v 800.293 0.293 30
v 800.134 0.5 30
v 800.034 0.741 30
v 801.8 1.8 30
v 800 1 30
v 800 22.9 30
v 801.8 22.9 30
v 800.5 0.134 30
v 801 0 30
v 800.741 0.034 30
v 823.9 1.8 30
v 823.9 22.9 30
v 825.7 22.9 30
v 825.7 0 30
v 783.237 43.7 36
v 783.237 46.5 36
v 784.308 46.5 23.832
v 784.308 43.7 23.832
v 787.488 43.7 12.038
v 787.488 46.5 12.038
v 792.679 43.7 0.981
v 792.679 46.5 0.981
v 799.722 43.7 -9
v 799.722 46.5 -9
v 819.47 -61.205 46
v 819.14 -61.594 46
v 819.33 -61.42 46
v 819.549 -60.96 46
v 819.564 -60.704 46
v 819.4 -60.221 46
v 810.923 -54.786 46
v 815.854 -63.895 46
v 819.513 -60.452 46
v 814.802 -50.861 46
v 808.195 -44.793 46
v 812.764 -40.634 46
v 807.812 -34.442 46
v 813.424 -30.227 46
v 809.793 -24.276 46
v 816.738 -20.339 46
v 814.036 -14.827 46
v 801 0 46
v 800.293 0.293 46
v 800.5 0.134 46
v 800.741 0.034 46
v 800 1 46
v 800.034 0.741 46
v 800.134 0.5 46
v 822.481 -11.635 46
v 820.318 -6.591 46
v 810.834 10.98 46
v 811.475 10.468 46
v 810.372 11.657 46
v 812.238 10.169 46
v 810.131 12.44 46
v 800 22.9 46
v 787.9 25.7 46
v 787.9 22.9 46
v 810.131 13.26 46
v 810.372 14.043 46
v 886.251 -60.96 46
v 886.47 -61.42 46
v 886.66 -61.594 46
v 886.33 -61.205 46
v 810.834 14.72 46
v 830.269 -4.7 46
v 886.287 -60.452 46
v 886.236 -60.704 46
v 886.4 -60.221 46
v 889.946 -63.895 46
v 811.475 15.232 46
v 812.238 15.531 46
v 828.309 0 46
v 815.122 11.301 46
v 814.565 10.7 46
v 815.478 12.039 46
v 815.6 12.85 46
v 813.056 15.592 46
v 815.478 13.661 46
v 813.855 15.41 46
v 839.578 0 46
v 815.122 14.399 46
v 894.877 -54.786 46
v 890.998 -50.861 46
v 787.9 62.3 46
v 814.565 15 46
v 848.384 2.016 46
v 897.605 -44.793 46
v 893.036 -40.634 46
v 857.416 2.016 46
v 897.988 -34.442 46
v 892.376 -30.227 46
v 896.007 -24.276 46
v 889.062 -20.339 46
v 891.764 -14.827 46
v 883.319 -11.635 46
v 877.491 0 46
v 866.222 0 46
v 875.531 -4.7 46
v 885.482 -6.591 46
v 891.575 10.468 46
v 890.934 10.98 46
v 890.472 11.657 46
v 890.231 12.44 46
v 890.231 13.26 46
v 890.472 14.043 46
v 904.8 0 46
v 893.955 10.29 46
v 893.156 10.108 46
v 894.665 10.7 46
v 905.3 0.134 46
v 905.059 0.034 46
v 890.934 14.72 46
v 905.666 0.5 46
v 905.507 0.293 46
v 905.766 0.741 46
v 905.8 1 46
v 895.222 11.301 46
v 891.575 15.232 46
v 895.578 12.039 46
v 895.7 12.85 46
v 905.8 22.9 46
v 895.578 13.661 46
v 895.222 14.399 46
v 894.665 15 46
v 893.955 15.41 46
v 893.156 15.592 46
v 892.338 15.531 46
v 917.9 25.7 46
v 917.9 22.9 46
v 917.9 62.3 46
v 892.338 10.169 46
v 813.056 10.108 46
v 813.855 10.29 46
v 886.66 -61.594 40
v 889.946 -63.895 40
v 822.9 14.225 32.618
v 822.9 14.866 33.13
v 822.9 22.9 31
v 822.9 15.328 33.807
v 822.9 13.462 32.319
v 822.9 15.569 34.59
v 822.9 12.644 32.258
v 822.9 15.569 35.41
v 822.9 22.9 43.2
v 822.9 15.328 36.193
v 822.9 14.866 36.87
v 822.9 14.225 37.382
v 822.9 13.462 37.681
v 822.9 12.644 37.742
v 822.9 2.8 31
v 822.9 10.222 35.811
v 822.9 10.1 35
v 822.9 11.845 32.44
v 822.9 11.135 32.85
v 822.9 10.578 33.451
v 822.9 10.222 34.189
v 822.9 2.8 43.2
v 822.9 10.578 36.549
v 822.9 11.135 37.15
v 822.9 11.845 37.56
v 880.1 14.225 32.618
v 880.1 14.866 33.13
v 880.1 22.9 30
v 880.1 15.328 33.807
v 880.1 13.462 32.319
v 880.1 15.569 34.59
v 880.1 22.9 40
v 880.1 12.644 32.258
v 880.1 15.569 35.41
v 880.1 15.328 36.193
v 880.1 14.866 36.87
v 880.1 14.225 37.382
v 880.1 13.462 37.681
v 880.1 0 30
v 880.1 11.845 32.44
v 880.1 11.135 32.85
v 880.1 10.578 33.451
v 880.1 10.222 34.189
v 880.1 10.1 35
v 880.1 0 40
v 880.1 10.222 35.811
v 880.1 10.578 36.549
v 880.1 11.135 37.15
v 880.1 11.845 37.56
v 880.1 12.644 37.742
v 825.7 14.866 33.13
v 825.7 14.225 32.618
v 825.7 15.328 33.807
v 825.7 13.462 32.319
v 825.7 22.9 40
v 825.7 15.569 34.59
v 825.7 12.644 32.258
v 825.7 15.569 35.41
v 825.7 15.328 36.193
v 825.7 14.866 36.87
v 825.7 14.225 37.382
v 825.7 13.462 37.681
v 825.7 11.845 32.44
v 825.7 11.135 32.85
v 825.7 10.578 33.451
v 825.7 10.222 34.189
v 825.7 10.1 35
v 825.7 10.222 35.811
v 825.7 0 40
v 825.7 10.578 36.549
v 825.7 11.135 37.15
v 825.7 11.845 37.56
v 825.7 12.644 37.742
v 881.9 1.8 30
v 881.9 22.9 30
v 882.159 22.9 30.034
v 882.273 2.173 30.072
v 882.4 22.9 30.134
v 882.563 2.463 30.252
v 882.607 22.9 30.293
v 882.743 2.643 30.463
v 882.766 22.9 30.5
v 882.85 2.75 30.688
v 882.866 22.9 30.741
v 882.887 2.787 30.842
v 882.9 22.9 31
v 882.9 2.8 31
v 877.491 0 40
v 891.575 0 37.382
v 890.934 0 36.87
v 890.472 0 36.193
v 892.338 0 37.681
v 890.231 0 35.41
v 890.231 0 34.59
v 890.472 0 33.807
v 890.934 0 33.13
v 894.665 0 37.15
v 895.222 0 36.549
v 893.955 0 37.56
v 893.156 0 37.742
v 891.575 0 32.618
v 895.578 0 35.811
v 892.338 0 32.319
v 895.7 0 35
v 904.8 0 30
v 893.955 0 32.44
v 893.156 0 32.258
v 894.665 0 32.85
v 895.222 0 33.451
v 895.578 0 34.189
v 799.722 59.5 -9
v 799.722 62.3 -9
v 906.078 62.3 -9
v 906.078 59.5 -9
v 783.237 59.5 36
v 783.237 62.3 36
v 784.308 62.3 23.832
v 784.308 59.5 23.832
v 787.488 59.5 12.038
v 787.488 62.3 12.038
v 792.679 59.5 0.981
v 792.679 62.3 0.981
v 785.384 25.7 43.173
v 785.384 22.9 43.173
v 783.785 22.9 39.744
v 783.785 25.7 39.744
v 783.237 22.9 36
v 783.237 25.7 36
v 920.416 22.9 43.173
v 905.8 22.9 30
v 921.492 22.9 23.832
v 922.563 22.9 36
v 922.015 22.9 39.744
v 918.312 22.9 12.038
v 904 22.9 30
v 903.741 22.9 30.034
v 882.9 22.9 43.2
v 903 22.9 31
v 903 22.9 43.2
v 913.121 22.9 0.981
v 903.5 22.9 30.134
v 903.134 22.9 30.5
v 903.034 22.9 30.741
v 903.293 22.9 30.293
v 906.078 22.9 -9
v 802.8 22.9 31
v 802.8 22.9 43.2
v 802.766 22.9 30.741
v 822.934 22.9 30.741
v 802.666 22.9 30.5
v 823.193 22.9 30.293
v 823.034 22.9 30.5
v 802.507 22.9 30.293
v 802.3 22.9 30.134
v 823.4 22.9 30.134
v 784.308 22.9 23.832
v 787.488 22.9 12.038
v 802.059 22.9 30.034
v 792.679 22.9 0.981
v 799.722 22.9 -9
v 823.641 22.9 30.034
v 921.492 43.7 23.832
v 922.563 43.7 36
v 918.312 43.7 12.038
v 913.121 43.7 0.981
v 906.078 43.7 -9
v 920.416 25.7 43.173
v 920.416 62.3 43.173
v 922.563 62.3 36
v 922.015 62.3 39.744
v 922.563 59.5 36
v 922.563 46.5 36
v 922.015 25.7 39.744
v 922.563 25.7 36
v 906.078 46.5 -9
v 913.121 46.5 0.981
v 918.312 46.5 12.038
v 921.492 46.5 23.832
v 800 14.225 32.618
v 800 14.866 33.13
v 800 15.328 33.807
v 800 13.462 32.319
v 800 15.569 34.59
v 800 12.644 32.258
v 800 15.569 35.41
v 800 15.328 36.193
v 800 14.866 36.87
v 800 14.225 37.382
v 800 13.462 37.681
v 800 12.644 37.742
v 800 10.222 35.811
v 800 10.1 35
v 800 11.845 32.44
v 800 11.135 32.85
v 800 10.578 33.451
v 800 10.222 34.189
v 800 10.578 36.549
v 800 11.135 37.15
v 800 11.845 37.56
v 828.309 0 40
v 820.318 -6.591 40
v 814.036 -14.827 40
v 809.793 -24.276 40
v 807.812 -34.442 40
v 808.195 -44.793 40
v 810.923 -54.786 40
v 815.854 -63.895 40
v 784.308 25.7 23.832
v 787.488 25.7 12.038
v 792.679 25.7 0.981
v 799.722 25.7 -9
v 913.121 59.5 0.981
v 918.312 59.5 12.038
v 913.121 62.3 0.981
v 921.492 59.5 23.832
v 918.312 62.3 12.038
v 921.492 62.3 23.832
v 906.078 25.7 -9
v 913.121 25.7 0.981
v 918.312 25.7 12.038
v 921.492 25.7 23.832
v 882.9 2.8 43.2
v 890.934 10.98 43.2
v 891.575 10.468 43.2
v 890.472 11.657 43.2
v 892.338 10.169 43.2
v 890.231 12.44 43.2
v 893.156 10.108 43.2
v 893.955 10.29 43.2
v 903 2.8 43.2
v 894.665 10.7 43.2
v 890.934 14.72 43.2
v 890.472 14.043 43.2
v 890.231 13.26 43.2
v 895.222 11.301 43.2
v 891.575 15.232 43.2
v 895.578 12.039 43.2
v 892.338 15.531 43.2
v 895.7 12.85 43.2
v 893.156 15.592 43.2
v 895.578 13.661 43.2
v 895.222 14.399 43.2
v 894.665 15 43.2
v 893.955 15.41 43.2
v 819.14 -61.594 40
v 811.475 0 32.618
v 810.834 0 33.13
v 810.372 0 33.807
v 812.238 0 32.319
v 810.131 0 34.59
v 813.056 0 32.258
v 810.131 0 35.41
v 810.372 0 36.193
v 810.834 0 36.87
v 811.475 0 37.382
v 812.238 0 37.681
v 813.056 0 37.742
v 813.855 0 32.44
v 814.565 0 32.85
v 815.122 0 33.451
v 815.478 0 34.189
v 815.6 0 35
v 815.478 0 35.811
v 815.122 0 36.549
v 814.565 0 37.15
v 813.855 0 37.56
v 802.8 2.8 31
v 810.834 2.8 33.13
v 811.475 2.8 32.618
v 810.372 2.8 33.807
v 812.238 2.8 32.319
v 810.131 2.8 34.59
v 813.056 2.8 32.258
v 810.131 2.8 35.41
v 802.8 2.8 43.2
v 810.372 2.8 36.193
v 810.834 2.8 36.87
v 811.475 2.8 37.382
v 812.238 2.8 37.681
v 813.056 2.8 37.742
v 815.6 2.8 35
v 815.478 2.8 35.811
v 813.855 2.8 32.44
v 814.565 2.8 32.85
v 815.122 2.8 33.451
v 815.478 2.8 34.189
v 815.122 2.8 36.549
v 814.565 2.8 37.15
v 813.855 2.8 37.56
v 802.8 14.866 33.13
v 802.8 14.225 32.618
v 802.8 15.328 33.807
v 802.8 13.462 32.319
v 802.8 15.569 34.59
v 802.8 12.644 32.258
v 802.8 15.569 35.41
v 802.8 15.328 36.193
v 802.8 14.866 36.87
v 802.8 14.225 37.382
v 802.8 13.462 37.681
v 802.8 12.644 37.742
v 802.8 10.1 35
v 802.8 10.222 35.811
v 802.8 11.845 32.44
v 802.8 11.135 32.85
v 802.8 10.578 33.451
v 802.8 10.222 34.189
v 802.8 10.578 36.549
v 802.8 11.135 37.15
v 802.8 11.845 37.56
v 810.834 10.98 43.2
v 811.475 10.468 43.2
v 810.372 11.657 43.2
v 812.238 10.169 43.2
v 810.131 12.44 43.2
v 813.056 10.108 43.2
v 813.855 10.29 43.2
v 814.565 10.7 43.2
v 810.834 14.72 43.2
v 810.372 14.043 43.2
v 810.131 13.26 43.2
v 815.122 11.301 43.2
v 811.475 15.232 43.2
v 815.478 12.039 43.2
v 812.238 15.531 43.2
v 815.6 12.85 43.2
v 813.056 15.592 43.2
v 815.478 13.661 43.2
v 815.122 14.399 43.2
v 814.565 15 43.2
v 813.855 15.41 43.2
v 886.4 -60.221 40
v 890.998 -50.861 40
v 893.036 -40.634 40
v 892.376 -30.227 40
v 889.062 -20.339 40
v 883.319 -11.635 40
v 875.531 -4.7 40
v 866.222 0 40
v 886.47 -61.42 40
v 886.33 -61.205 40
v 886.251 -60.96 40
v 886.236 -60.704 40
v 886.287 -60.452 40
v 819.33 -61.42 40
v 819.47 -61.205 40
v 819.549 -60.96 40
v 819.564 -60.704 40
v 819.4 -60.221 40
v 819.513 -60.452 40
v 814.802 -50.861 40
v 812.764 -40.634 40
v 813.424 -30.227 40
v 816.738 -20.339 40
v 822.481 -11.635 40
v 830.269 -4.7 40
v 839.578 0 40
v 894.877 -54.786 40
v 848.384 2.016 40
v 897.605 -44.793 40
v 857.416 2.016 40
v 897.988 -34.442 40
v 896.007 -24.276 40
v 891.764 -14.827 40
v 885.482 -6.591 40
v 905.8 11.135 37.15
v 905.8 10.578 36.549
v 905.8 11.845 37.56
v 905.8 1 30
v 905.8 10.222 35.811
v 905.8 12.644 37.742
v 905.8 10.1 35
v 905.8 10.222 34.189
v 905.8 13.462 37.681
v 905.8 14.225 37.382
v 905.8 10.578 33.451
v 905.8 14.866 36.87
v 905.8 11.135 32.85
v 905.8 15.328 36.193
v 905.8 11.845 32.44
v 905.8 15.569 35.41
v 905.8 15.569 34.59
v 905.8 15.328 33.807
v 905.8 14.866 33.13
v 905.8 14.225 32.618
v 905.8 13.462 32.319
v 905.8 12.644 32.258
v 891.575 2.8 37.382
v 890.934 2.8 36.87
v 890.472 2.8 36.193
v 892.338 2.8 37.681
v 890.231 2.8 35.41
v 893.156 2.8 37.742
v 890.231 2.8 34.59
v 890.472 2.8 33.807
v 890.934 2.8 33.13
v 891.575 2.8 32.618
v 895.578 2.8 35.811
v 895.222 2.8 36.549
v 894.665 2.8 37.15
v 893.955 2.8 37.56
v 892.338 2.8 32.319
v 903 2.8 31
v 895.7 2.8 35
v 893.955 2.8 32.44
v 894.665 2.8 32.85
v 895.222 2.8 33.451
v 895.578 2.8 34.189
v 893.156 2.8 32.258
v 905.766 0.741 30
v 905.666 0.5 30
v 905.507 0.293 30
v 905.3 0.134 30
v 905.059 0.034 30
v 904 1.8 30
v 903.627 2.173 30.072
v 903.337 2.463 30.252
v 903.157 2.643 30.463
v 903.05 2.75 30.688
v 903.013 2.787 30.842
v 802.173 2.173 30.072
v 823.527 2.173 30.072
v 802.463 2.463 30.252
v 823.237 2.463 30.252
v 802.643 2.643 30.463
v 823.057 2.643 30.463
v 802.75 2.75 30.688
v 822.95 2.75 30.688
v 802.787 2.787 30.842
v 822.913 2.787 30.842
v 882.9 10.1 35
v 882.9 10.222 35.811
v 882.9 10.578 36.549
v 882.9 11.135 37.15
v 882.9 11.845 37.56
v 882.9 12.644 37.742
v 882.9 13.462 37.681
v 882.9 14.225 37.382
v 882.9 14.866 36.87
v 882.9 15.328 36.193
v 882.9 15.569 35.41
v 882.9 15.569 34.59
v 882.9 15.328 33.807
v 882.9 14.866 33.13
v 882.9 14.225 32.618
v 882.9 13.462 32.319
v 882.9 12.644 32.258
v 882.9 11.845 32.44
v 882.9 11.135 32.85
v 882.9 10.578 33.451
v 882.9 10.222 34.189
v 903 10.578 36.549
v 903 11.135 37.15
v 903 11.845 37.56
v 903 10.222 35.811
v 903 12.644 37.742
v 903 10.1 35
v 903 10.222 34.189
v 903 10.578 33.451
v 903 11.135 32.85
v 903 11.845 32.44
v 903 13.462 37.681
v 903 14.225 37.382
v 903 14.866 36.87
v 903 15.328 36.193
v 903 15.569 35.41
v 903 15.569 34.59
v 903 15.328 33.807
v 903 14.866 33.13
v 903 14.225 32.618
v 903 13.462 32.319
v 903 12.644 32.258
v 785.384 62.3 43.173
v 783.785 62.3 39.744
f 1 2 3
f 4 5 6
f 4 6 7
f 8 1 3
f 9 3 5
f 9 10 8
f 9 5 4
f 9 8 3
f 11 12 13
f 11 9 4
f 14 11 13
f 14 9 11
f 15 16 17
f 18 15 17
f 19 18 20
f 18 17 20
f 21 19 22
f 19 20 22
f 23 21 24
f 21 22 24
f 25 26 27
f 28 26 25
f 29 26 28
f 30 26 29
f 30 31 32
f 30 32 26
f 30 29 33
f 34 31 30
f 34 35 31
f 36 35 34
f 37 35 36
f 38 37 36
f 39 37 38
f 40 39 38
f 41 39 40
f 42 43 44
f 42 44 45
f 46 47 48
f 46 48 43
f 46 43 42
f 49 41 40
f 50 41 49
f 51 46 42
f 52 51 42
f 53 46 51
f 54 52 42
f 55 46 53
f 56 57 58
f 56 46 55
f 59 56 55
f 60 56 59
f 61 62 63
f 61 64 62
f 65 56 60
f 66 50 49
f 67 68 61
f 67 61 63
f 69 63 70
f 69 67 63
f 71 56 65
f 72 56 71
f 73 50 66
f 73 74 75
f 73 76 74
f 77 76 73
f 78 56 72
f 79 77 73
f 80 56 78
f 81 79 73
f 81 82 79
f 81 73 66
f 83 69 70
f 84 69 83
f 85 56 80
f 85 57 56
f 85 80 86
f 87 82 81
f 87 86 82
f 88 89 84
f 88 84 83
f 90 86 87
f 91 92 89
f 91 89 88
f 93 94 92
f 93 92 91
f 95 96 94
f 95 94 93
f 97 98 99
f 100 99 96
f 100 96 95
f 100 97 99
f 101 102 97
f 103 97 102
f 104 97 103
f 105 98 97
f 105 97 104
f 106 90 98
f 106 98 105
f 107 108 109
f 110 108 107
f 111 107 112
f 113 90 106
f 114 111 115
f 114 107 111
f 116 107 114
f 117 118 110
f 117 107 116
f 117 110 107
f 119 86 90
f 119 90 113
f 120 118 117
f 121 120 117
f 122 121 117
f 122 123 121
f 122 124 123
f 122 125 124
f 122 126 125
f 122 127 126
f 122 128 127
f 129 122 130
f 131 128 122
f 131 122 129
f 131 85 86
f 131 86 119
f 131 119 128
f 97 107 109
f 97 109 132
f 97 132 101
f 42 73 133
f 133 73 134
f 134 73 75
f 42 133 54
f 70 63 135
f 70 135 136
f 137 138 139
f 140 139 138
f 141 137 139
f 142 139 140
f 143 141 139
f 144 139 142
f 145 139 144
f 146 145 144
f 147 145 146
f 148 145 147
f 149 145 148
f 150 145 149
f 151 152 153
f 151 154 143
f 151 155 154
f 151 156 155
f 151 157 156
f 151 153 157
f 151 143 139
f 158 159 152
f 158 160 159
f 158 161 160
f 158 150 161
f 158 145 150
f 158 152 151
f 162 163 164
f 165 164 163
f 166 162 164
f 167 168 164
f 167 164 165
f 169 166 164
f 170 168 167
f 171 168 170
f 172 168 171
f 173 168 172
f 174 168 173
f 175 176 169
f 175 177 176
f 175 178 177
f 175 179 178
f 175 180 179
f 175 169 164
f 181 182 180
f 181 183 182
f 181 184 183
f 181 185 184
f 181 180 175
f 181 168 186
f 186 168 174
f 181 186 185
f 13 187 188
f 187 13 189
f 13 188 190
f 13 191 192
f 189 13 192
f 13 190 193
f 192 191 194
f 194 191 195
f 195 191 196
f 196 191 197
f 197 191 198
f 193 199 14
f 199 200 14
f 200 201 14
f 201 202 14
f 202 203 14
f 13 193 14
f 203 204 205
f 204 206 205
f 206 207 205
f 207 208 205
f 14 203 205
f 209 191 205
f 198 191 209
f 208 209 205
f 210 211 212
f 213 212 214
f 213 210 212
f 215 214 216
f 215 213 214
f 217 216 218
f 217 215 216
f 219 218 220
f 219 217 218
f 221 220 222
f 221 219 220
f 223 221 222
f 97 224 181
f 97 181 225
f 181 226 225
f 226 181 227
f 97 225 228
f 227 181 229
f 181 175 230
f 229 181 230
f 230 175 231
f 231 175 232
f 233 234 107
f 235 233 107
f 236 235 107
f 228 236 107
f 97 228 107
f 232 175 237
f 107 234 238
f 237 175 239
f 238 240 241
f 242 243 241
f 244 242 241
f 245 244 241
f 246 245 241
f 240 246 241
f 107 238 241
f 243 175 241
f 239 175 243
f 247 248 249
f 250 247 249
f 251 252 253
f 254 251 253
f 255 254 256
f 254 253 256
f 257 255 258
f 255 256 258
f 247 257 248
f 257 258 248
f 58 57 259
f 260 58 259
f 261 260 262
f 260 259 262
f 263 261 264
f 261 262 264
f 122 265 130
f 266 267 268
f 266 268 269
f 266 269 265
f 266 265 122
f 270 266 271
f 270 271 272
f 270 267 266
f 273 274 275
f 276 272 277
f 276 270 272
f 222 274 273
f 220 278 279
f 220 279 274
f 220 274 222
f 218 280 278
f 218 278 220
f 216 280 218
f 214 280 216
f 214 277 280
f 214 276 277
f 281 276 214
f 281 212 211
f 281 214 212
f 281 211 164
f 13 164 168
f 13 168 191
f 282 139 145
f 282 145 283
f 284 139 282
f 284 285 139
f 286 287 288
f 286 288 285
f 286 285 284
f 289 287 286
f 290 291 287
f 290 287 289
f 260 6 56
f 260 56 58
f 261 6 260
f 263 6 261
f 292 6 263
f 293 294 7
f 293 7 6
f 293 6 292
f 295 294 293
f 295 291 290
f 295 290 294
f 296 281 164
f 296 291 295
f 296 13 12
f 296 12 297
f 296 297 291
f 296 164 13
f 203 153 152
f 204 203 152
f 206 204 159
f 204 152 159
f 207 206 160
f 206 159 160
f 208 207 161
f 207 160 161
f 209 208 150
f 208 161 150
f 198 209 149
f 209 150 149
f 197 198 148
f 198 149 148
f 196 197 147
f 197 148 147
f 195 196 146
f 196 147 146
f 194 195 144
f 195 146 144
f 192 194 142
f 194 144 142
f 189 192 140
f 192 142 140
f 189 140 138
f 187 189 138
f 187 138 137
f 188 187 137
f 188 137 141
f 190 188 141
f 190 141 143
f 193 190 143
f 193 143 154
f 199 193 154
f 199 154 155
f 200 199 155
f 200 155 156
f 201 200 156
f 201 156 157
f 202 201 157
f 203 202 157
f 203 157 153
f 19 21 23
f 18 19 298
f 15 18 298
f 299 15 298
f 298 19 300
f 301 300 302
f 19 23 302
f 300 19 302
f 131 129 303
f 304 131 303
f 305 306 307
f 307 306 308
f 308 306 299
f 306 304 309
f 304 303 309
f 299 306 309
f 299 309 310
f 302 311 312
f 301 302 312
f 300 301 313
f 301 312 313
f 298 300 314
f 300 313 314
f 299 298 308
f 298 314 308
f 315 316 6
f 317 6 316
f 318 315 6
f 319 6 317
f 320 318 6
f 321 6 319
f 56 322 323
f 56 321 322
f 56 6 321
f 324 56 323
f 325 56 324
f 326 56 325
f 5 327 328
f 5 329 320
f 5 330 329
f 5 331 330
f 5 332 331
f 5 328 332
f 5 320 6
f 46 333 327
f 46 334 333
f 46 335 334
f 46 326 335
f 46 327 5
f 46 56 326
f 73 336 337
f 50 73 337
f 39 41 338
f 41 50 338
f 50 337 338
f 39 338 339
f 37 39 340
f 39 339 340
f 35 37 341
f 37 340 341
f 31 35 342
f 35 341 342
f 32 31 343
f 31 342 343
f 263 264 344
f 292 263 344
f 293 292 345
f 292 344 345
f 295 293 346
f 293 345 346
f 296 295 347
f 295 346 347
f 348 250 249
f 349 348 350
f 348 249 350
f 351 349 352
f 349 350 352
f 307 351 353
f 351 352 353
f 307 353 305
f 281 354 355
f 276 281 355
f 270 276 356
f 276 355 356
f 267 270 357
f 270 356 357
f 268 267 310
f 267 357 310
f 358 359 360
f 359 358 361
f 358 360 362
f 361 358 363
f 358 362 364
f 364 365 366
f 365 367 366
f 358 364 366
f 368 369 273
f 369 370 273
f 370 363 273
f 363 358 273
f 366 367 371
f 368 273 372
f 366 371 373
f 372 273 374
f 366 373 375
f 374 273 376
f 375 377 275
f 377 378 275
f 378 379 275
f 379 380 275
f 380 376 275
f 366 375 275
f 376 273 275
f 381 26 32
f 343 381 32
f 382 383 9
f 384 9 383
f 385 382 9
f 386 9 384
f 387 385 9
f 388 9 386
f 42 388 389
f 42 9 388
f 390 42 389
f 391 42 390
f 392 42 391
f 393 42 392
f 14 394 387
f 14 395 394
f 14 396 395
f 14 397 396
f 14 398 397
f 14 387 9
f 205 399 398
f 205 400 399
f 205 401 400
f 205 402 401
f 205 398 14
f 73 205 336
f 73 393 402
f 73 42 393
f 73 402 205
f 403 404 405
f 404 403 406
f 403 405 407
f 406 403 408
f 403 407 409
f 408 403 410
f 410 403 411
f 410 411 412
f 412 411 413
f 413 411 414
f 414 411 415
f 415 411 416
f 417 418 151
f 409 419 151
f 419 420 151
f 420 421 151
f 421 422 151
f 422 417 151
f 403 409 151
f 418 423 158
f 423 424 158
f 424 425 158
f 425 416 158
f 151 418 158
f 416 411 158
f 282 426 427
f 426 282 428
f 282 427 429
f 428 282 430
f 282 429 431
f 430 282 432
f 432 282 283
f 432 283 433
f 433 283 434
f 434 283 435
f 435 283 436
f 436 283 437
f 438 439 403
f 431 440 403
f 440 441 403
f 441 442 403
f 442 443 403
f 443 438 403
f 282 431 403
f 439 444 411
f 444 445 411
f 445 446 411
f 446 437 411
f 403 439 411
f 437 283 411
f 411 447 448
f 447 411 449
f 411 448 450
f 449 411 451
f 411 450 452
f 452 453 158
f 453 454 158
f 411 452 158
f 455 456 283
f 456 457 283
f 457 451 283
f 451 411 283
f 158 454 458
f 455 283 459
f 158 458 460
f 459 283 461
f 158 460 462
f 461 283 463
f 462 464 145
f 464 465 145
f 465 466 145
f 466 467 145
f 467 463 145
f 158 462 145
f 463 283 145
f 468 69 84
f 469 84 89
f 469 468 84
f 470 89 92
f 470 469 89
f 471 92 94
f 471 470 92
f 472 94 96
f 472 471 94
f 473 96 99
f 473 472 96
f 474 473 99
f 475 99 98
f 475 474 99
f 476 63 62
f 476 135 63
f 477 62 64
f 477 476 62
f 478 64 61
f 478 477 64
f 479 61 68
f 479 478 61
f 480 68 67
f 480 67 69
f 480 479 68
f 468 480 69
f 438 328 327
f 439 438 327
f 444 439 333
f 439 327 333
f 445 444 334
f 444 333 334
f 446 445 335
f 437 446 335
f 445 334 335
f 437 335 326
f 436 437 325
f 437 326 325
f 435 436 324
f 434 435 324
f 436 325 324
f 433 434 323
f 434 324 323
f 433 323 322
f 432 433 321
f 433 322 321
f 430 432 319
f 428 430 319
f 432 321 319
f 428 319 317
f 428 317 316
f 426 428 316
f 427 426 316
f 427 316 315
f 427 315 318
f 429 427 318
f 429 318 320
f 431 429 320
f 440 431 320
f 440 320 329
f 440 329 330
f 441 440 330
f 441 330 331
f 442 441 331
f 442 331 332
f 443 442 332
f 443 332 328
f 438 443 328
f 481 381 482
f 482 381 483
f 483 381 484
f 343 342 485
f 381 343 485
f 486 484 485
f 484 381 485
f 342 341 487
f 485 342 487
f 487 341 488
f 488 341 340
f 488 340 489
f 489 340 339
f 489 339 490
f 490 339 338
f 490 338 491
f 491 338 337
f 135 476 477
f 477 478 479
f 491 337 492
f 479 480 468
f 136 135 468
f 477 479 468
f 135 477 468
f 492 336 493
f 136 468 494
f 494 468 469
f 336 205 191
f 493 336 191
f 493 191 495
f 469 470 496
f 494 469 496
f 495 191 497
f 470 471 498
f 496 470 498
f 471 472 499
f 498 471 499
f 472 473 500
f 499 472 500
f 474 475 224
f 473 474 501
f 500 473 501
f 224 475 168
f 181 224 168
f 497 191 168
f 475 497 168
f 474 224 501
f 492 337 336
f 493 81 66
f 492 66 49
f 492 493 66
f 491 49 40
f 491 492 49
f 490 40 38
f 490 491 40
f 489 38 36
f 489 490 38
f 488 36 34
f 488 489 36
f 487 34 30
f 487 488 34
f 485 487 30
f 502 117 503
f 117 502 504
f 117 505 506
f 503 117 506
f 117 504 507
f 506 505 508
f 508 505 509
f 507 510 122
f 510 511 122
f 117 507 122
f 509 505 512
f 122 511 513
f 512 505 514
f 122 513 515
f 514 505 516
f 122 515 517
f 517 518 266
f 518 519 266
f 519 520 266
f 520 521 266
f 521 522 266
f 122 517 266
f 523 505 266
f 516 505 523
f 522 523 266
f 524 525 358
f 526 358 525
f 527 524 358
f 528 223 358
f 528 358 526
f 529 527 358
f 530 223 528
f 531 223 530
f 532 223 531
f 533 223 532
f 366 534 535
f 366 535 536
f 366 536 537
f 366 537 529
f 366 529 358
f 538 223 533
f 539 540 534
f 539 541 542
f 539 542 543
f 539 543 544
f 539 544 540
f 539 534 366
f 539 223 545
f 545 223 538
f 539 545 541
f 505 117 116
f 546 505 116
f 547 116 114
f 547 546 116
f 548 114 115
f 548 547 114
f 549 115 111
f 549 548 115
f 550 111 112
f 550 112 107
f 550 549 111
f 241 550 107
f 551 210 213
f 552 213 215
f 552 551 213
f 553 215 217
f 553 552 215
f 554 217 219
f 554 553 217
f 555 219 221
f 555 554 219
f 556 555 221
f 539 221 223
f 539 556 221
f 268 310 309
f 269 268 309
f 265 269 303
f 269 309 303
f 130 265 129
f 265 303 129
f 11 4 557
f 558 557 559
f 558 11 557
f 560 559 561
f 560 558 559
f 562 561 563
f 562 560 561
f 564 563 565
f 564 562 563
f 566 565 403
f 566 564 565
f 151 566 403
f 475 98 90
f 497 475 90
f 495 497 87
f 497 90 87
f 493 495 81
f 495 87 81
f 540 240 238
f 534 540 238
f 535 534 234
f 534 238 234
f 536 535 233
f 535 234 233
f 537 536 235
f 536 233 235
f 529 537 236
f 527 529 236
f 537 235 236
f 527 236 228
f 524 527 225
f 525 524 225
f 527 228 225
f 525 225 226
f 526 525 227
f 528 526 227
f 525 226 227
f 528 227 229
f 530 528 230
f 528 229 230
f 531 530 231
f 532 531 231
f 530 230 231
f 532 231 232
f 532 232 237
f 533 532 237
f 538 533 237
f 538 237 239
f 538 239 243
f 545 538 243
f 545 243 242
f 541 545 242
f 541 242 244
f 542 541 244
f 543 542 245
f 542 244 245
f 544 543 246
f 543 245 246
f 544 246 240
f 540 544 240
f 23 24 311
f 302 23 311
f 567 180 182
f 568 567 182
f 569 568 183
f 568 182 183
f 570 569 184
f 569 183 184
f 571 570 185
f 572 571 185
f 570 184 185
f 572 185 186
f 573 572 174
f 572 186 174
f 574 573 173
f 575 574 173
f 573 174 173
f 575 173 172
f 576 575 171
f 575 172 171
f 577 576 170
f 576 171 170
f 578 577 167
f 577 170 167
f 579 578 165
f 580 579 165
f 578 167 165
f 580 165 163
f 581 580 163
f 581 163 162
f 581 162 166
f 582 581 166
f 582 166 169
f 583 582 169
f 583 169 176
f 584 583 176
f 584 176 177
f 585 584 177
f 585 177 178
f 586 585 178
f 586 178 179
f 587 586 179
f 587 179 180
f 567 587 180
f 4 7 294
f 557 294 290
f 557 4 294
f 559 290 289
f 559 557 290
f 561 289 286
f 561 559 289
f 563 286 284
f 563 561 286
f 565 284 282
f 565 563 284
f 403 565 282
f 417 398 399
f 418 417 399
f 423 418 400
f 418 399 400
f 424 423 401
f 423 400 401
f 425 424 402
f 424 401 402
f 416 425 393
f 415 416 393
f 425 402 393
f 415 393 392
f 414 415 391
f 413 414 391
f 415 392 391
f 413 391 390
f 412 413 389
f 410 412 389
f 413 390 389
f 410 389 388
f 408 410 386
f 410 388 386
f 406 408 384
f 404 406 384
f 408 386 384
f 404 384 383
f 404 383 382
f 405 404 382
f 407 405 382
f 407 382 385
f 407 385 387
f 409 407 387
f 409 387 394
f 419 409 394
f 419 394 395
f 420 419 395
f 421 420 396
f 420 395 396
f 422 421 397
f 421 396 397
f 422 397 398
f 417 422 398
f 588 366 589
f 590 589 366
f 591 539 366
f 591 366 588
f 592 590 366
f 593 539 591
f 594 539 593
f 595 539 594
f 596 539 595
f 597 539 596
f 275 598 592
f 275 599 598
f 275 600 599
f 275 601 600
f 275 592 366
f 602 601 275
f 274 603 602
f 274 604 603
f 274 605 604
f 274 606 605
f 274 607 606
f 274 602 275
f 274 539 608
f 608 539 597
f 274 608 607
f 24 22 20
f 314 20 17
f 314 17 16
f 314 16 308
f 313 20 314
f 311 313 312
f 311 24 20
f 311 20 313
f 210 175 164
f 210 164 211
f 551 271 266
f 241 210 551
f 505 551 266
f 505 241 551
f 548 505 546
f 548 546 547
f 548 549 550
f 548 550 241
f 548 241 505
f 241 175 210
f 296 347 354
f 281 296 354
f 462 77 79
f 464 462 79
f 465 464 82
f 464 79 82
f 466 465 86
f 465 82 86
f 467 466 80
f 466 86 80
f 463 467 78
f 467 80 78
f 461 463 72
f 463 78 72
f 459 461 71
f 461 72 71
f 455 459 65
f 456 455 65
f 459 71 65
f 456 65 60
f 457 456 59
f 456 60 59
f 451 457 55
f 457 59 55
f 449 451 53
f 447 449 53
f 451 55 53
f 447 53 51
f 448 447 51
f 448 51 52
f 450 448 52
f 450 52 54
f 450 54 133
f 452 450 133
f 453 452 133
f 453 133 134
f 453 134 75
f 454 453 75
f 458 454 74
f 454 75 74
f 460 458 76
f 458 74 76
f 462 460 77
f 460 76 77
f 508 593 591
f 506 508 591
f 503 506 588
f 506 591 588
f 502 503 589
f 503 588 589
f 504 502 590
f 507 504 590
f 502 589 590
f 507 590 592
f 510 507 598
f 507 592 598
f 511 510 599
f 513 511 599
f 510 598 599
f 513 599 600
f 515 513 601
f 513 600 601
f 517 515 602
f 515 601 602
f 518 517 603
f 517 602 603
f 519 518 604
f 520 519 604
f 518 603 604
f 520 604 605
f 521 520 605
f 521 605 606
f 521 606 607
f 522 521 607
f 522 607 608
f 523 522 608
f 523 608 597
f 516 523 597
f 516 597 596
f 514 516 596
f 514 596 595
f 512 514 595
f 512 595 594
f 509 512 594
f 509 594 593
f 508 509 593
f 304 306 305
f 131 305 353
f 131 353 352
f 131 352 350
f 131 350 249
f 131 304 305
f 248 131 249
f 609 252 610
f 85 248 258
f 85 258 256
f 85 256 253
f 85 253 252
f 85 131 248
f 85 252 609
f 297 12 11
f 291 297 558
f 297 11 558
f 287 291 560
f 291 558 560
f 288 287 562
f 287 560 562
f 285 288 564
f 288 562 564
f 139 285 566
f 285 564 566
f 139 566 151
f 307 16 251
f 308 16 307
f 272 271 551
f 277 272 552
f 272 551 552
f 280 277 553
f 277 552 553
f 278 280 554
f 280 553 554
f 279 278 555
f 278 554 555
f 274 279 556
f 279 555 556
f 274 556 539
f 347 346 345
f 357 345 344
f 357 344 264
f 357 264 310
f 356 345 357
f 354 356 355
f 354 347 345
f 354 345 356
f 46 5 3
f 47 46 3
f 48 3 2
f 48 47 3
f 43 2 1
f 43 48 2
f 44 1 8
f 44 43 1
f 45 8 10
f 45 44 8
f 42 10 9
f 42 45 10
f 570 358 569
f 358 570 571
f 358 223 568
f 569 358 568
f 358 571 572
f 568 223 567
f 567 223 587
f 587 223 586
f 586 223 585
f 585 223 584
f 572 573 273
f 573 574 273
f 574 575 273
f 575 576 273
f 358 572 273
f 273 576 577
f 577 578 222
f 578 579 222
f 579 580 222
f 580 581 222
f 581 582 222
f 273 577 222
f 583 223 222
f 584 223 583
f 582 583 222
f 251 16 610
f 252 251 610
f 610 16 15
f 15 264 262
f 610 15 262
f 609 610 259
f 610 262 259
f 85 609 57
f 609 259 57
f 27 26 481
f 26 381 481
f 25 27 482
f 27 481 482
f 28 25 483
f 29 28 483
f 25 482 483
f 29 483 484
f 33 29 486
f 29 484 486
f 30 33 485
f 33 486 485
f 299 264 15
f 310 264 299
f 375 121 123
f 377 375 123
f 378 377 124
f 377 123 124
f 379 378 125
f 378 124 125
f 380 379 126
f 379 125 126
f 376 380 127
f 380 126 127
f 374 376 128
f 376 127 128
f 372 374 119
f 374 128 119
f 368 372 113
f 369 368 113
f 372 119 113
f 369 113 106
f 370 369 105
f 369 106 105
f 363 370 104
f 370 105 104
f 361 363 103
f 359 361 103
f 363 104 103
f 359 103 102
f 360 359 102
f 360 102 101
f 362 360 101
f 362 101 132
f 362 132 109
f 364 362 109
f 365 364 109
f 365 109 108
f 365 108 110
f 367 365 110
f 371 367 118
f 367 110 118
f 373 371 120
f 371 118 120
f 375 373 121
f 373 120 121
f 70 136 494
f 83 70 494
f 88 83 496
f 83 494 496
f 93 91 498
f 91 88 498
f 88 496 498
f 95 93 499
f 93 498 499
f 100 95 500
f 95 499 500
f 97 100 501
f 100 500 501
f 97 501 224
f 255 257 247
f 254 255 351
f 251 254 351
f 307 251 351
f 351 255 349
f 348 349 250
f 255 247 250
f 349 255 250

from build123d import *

# Parameters (mm, degrees)
SKETCH047_W     = 105.8
SKETCH047_H     = 25.7
SKETCH047_W_2   = 20.1
SKETCH047_H_2   = 20.1
PAD026_DEPTH    = 6
SKETCH043_R     = 45.225
SKETCH043_R_2   = 40.225
PAD027_DEPTH    = 6
POCKET028_DEPTH = 6
POCKET026_DEPTH = 6
FILLET011_R     = 1
SKETCH049_W     = 25.7
SKETCH049_H     = 25.7
SKETCH049_W_2   = 20.1
SKETCH049_H_2   = 20.1
PAD023_DEPTH    = 10
SKETCH045_R     = 2.75
POCKET031_DEPTH = 105.8
SKETCH042_R     = 2.75
POCKET029_DEPTH = 2.8
FILLET010_R     = 1
PAD024_DEPTH    = 36.6
PAD025_DEPTH    = 2.8
SKETCH048_W     = 139.326154
SKETCH048_H     = 62.3
POCKET027_DEPTH = 61
SKETCH044_W     = 139.326154
SKETCH044_H     = 18
SKETCH044_H_2   = 13
POCKET030_DEPTH = 45
SKETCH052_W     = 20.1
SKETCH052_H     = 20.1
SKETCH052_R     = 2.75
PAD029_DEPTH    = 2.8


with BuildPart() as part:
    # Sketch047 → Pad026 (new body)
    with BuildSketch(Plane.XY):
        with Locations((52.9, 12.85)):
            Rectangle(SKETCH047_W, SKETCH047_H)
        with Locations((12.85, 12.85)):
            Rectangle(SKETCH047_W_2, SKETCH047_H_2, mode=Mode.SUBTRACT)
        with Locations((92.95, 12.85)):
            Rectangle(SKETCH047_W_2, SKETCH047_H_2, mode=Mode.SUBTRACT)
    extrude(amount=PAD026_DEPTH)

    # Sketch043 → Pad027 (join)
    with BuildSketch(Plane.XY):
        with Locations((52.9, -37.955)):
            Circle(SKETCH043_R)
        with Locations((52.9, -37.955)):
            Circle(SKETCH043_R_2, mode=Mode.SUBTRACT)
    extrude(amount=PAD027_DEPTH)

    # Pad027 Face25 → Pocket028 (cut)
    with BuildSketch(Plane(origin=(52.9, 0.910232, 6), x_dir=(0, 1, 0), z_dir=(0, 0, 1))):
        with BuildLine():
            ThreePointArc((-0.910232, -13.321734), (1.359768, 0), (-0.910232, 13.321734))
            Line((-0.910232, 13.321734), (-0.910232, -13.321734))
        make_face()
    extrude(amount=-POCKET028_DEPTH, mode=Mode.SUBTRACT)

    # Sketch050 → Pocket026 (cut)
    with BuildSketch(Plane.XY):
        with BuildLine():
            Line((52.9, -37.955), (94.041911, -66.762877))
            ThreePointArc((11.758089, -66.762877), (52.9, -88.18), (94.041911, -66.762877))
            Line((52.9, -37.955), (11.758089, -66.762877))
        make_face()
    extrude(amount=POCKET026_DEPTH, mode=Mode.SUBTRACT)

    # Fillet011
    fillet011_edges = [part.edges().sort_by_distance(p)[0] for p in [
        (19.949609, -61.027112, 3),
        (85.850391, -61.027112, 3),
    ]]
    fillet(fillet011_edges, radius=FILLET011_R)

    # Sketch049 (on Face11 of Fillet011) → Pad023 (join)
    with BuildSketch(Plane(origin=(0, 0, 0), x_dir=(1, 0, 0), z_dir=(0, 0, -1))):
        with Locations((12.85, -12.85)):
            Rectangle(SKETCH049_W, SKETCH049_H)
        with Locations((12.85, -12.85)):
            Rectangle(SKETCH049_W_2, SKETCH049_H_2, mode=Mode.SUBTRACT)
        with Locations((92.95, -12.85)):
            Rectangle(SKETCH049_W, SKETCH049_H)
        with Locations((92.95, -12.85)):
            Rectangle(SKETCH049_W_2, SKETCH049_H_2, mode=Mode.SUBTRACT)
    extrude(amount=PAD023_DEPTH)

    # Sketch045 (on Face27 of Pad023) → Pocket031 (cut)
    with BuildSketch(Plane(origin=(0, 0, 0), x_dir=(0, -1, 0), z_dir=(-1, 0, 0))):
        with Locations((-12.85, -5)):
            Circle(SKETCH045_R)
    extrude(amount=-POCKET031_DEPTH, mode=Mode.SUBTRACT)

    # Sketch042 (on Face13 of Pocket031) → Pocket029 (cut)
    with BuildSketch(Plane.XZ):
        with Locations((12.85, -5)):
            Circle(SKETCH042_R)
        with Locations((92.95, -5)):
            Circle(SKETCH042_R)
    extrude(amount=-POCKET029_DEPTH, mode=Mode.SUBTRACT)

    # Fillet010
    fillet010_edges = [part.edges().sort_by_distance(p)[0] for p in [
        (103, 12.85, -10),
        (92.95, 2.8, -10),
        (82.9, 12.85, -10),
        (22.9, 12.85, -10),
        (12.85, 2.8, -10),
        (2.8, 12.85, -10),
        (0, 0, -5),
        (0, 0, 3),
        (105.8, 0, -5),
        (105.8, 0, 3),
    ]]
    fillet(fillet010_edges, radius=FILLET010_R)

    # Sketch046 (on Face12 of Fillet010) → Pad024 (join)
    with BuildSketch(Plane(origin=(0, 25.7, 0), x_dir=(-1, 0, 0), z_dir=(0, 1, 0))):
        with BuildLine():
            Line((12.1, 6), (-117.9, 6))
            ThreePointArc((-117.9, 6), (-121.340012, 1.51689), (-122.563077, -4))
            ThreePointArc((-122.563077, -4), (-52.9, -73.663077), (16.763077, -4))
            ThreePointArc((16.763077, -4), (15.540012, 1.51689), (12.1, 6))
        make_face()
    extrude(amount=PAD024_DEPTH)

    # Pad024 Face4 → Pad025 (add)
    with BuildSketch(Plane(origin=(52.9, 25.7, -32.391454), x_dir=(-1, 0, 0), z_dir=(0, -1, 0))):
        with BuildLine():
            ThreePointArc((65, -38.391454), (68.440012, -33.908343), (69.663077, -28.391454))
            ThreePointArc((69.663077, -28.391454), (0, 41.271623), (-69.663077, -28.391454))
            ThreePointArc((-69.663077, -28.391454), (-68.440012, -33.908343), (-65, -38.391454))
            Line((-65, -38.391454), (-52.9, -38.391454))
            Line((-52.9, -38.391454), (-52.9, -32.391454))
            Line((-52.9, -32.391454), (-52.9, -22.391454))
            Line((-52.9, -22.391454), (-27.2, -22.391454))
            Line((-27.2, -22.391454), (-27.2, -32.391454))
            Line((-27.2, -32.391454), (27.2, -32.391454))
            Line((27.2, -32.391454), (27.2, -22.391454))
            Line((27.2, -22.391454), (52.9, -22.391454))
            Line((52.9, -22.391454), (52.9, -32.391454))
            Line((52.9, -32.391454), (52.9, -38.391454))
            Line((52.9, -38.391454), (65, -38.391454))
        make_face()
    extrude(amount=PAD025_DEPTH)

    # Sketch048 → Pocket027 (cut)
    with BuildSketch(Plane.XY.offset(-49)):
        with Locations((52.9, 31.15)):
            Rectangle(SKETCH048_W, SKETCH048_H)
    extrude(amount=-POCKET027_DEPTH, mode=Mode.SUBTRACT)

    # Sketch044 (on Face28 of Pocket027) → Pocket030 (cut)
    with BuildSketch(Plane(origin=(0, 0, -49), x_dir=(1, 0, 0), z_dir=(0, 0, -1))):
        with Locations((52.9, -34.7)):
            Rectangle(SKETCH044_W, SKETCH044_H)
        with Locations((52.9, -53)):
            Rectangle(SKETCH044_W, SKETCH044_H_2)
    extrude(amount=-POCKET030_DEPTH, mode=Mode.SUBTRACT)

    # Sketch052 (on Face5 of Pocket030) → Pad029 (join)
    with BuildSketch(Plane.XY.offset(6)):
        with Locations((12.85, 12.85)):
            Rectangle(SKETCH052_W, SKETCH052_H)
        with Locations((12.85, 12.85)):
            Circle(SKETCH052_R, mode=Mode.SUBTRACT)
        with Locations((92.95, 12.85)):
            Rectangle(SKETCH052_W, SKETCH052_H)
        with Locations((92.95, 12.85)):
            Circle(SKETCH052_R, mode=Mode.SUBTRACT)
    extrude(amount=-PAD029_DEPTH)


with BuildPart() as part_1:
    # Body007 placement: moved
    add(part.part.moved(Location((800, 0, 40))))


solid = part_1.part
